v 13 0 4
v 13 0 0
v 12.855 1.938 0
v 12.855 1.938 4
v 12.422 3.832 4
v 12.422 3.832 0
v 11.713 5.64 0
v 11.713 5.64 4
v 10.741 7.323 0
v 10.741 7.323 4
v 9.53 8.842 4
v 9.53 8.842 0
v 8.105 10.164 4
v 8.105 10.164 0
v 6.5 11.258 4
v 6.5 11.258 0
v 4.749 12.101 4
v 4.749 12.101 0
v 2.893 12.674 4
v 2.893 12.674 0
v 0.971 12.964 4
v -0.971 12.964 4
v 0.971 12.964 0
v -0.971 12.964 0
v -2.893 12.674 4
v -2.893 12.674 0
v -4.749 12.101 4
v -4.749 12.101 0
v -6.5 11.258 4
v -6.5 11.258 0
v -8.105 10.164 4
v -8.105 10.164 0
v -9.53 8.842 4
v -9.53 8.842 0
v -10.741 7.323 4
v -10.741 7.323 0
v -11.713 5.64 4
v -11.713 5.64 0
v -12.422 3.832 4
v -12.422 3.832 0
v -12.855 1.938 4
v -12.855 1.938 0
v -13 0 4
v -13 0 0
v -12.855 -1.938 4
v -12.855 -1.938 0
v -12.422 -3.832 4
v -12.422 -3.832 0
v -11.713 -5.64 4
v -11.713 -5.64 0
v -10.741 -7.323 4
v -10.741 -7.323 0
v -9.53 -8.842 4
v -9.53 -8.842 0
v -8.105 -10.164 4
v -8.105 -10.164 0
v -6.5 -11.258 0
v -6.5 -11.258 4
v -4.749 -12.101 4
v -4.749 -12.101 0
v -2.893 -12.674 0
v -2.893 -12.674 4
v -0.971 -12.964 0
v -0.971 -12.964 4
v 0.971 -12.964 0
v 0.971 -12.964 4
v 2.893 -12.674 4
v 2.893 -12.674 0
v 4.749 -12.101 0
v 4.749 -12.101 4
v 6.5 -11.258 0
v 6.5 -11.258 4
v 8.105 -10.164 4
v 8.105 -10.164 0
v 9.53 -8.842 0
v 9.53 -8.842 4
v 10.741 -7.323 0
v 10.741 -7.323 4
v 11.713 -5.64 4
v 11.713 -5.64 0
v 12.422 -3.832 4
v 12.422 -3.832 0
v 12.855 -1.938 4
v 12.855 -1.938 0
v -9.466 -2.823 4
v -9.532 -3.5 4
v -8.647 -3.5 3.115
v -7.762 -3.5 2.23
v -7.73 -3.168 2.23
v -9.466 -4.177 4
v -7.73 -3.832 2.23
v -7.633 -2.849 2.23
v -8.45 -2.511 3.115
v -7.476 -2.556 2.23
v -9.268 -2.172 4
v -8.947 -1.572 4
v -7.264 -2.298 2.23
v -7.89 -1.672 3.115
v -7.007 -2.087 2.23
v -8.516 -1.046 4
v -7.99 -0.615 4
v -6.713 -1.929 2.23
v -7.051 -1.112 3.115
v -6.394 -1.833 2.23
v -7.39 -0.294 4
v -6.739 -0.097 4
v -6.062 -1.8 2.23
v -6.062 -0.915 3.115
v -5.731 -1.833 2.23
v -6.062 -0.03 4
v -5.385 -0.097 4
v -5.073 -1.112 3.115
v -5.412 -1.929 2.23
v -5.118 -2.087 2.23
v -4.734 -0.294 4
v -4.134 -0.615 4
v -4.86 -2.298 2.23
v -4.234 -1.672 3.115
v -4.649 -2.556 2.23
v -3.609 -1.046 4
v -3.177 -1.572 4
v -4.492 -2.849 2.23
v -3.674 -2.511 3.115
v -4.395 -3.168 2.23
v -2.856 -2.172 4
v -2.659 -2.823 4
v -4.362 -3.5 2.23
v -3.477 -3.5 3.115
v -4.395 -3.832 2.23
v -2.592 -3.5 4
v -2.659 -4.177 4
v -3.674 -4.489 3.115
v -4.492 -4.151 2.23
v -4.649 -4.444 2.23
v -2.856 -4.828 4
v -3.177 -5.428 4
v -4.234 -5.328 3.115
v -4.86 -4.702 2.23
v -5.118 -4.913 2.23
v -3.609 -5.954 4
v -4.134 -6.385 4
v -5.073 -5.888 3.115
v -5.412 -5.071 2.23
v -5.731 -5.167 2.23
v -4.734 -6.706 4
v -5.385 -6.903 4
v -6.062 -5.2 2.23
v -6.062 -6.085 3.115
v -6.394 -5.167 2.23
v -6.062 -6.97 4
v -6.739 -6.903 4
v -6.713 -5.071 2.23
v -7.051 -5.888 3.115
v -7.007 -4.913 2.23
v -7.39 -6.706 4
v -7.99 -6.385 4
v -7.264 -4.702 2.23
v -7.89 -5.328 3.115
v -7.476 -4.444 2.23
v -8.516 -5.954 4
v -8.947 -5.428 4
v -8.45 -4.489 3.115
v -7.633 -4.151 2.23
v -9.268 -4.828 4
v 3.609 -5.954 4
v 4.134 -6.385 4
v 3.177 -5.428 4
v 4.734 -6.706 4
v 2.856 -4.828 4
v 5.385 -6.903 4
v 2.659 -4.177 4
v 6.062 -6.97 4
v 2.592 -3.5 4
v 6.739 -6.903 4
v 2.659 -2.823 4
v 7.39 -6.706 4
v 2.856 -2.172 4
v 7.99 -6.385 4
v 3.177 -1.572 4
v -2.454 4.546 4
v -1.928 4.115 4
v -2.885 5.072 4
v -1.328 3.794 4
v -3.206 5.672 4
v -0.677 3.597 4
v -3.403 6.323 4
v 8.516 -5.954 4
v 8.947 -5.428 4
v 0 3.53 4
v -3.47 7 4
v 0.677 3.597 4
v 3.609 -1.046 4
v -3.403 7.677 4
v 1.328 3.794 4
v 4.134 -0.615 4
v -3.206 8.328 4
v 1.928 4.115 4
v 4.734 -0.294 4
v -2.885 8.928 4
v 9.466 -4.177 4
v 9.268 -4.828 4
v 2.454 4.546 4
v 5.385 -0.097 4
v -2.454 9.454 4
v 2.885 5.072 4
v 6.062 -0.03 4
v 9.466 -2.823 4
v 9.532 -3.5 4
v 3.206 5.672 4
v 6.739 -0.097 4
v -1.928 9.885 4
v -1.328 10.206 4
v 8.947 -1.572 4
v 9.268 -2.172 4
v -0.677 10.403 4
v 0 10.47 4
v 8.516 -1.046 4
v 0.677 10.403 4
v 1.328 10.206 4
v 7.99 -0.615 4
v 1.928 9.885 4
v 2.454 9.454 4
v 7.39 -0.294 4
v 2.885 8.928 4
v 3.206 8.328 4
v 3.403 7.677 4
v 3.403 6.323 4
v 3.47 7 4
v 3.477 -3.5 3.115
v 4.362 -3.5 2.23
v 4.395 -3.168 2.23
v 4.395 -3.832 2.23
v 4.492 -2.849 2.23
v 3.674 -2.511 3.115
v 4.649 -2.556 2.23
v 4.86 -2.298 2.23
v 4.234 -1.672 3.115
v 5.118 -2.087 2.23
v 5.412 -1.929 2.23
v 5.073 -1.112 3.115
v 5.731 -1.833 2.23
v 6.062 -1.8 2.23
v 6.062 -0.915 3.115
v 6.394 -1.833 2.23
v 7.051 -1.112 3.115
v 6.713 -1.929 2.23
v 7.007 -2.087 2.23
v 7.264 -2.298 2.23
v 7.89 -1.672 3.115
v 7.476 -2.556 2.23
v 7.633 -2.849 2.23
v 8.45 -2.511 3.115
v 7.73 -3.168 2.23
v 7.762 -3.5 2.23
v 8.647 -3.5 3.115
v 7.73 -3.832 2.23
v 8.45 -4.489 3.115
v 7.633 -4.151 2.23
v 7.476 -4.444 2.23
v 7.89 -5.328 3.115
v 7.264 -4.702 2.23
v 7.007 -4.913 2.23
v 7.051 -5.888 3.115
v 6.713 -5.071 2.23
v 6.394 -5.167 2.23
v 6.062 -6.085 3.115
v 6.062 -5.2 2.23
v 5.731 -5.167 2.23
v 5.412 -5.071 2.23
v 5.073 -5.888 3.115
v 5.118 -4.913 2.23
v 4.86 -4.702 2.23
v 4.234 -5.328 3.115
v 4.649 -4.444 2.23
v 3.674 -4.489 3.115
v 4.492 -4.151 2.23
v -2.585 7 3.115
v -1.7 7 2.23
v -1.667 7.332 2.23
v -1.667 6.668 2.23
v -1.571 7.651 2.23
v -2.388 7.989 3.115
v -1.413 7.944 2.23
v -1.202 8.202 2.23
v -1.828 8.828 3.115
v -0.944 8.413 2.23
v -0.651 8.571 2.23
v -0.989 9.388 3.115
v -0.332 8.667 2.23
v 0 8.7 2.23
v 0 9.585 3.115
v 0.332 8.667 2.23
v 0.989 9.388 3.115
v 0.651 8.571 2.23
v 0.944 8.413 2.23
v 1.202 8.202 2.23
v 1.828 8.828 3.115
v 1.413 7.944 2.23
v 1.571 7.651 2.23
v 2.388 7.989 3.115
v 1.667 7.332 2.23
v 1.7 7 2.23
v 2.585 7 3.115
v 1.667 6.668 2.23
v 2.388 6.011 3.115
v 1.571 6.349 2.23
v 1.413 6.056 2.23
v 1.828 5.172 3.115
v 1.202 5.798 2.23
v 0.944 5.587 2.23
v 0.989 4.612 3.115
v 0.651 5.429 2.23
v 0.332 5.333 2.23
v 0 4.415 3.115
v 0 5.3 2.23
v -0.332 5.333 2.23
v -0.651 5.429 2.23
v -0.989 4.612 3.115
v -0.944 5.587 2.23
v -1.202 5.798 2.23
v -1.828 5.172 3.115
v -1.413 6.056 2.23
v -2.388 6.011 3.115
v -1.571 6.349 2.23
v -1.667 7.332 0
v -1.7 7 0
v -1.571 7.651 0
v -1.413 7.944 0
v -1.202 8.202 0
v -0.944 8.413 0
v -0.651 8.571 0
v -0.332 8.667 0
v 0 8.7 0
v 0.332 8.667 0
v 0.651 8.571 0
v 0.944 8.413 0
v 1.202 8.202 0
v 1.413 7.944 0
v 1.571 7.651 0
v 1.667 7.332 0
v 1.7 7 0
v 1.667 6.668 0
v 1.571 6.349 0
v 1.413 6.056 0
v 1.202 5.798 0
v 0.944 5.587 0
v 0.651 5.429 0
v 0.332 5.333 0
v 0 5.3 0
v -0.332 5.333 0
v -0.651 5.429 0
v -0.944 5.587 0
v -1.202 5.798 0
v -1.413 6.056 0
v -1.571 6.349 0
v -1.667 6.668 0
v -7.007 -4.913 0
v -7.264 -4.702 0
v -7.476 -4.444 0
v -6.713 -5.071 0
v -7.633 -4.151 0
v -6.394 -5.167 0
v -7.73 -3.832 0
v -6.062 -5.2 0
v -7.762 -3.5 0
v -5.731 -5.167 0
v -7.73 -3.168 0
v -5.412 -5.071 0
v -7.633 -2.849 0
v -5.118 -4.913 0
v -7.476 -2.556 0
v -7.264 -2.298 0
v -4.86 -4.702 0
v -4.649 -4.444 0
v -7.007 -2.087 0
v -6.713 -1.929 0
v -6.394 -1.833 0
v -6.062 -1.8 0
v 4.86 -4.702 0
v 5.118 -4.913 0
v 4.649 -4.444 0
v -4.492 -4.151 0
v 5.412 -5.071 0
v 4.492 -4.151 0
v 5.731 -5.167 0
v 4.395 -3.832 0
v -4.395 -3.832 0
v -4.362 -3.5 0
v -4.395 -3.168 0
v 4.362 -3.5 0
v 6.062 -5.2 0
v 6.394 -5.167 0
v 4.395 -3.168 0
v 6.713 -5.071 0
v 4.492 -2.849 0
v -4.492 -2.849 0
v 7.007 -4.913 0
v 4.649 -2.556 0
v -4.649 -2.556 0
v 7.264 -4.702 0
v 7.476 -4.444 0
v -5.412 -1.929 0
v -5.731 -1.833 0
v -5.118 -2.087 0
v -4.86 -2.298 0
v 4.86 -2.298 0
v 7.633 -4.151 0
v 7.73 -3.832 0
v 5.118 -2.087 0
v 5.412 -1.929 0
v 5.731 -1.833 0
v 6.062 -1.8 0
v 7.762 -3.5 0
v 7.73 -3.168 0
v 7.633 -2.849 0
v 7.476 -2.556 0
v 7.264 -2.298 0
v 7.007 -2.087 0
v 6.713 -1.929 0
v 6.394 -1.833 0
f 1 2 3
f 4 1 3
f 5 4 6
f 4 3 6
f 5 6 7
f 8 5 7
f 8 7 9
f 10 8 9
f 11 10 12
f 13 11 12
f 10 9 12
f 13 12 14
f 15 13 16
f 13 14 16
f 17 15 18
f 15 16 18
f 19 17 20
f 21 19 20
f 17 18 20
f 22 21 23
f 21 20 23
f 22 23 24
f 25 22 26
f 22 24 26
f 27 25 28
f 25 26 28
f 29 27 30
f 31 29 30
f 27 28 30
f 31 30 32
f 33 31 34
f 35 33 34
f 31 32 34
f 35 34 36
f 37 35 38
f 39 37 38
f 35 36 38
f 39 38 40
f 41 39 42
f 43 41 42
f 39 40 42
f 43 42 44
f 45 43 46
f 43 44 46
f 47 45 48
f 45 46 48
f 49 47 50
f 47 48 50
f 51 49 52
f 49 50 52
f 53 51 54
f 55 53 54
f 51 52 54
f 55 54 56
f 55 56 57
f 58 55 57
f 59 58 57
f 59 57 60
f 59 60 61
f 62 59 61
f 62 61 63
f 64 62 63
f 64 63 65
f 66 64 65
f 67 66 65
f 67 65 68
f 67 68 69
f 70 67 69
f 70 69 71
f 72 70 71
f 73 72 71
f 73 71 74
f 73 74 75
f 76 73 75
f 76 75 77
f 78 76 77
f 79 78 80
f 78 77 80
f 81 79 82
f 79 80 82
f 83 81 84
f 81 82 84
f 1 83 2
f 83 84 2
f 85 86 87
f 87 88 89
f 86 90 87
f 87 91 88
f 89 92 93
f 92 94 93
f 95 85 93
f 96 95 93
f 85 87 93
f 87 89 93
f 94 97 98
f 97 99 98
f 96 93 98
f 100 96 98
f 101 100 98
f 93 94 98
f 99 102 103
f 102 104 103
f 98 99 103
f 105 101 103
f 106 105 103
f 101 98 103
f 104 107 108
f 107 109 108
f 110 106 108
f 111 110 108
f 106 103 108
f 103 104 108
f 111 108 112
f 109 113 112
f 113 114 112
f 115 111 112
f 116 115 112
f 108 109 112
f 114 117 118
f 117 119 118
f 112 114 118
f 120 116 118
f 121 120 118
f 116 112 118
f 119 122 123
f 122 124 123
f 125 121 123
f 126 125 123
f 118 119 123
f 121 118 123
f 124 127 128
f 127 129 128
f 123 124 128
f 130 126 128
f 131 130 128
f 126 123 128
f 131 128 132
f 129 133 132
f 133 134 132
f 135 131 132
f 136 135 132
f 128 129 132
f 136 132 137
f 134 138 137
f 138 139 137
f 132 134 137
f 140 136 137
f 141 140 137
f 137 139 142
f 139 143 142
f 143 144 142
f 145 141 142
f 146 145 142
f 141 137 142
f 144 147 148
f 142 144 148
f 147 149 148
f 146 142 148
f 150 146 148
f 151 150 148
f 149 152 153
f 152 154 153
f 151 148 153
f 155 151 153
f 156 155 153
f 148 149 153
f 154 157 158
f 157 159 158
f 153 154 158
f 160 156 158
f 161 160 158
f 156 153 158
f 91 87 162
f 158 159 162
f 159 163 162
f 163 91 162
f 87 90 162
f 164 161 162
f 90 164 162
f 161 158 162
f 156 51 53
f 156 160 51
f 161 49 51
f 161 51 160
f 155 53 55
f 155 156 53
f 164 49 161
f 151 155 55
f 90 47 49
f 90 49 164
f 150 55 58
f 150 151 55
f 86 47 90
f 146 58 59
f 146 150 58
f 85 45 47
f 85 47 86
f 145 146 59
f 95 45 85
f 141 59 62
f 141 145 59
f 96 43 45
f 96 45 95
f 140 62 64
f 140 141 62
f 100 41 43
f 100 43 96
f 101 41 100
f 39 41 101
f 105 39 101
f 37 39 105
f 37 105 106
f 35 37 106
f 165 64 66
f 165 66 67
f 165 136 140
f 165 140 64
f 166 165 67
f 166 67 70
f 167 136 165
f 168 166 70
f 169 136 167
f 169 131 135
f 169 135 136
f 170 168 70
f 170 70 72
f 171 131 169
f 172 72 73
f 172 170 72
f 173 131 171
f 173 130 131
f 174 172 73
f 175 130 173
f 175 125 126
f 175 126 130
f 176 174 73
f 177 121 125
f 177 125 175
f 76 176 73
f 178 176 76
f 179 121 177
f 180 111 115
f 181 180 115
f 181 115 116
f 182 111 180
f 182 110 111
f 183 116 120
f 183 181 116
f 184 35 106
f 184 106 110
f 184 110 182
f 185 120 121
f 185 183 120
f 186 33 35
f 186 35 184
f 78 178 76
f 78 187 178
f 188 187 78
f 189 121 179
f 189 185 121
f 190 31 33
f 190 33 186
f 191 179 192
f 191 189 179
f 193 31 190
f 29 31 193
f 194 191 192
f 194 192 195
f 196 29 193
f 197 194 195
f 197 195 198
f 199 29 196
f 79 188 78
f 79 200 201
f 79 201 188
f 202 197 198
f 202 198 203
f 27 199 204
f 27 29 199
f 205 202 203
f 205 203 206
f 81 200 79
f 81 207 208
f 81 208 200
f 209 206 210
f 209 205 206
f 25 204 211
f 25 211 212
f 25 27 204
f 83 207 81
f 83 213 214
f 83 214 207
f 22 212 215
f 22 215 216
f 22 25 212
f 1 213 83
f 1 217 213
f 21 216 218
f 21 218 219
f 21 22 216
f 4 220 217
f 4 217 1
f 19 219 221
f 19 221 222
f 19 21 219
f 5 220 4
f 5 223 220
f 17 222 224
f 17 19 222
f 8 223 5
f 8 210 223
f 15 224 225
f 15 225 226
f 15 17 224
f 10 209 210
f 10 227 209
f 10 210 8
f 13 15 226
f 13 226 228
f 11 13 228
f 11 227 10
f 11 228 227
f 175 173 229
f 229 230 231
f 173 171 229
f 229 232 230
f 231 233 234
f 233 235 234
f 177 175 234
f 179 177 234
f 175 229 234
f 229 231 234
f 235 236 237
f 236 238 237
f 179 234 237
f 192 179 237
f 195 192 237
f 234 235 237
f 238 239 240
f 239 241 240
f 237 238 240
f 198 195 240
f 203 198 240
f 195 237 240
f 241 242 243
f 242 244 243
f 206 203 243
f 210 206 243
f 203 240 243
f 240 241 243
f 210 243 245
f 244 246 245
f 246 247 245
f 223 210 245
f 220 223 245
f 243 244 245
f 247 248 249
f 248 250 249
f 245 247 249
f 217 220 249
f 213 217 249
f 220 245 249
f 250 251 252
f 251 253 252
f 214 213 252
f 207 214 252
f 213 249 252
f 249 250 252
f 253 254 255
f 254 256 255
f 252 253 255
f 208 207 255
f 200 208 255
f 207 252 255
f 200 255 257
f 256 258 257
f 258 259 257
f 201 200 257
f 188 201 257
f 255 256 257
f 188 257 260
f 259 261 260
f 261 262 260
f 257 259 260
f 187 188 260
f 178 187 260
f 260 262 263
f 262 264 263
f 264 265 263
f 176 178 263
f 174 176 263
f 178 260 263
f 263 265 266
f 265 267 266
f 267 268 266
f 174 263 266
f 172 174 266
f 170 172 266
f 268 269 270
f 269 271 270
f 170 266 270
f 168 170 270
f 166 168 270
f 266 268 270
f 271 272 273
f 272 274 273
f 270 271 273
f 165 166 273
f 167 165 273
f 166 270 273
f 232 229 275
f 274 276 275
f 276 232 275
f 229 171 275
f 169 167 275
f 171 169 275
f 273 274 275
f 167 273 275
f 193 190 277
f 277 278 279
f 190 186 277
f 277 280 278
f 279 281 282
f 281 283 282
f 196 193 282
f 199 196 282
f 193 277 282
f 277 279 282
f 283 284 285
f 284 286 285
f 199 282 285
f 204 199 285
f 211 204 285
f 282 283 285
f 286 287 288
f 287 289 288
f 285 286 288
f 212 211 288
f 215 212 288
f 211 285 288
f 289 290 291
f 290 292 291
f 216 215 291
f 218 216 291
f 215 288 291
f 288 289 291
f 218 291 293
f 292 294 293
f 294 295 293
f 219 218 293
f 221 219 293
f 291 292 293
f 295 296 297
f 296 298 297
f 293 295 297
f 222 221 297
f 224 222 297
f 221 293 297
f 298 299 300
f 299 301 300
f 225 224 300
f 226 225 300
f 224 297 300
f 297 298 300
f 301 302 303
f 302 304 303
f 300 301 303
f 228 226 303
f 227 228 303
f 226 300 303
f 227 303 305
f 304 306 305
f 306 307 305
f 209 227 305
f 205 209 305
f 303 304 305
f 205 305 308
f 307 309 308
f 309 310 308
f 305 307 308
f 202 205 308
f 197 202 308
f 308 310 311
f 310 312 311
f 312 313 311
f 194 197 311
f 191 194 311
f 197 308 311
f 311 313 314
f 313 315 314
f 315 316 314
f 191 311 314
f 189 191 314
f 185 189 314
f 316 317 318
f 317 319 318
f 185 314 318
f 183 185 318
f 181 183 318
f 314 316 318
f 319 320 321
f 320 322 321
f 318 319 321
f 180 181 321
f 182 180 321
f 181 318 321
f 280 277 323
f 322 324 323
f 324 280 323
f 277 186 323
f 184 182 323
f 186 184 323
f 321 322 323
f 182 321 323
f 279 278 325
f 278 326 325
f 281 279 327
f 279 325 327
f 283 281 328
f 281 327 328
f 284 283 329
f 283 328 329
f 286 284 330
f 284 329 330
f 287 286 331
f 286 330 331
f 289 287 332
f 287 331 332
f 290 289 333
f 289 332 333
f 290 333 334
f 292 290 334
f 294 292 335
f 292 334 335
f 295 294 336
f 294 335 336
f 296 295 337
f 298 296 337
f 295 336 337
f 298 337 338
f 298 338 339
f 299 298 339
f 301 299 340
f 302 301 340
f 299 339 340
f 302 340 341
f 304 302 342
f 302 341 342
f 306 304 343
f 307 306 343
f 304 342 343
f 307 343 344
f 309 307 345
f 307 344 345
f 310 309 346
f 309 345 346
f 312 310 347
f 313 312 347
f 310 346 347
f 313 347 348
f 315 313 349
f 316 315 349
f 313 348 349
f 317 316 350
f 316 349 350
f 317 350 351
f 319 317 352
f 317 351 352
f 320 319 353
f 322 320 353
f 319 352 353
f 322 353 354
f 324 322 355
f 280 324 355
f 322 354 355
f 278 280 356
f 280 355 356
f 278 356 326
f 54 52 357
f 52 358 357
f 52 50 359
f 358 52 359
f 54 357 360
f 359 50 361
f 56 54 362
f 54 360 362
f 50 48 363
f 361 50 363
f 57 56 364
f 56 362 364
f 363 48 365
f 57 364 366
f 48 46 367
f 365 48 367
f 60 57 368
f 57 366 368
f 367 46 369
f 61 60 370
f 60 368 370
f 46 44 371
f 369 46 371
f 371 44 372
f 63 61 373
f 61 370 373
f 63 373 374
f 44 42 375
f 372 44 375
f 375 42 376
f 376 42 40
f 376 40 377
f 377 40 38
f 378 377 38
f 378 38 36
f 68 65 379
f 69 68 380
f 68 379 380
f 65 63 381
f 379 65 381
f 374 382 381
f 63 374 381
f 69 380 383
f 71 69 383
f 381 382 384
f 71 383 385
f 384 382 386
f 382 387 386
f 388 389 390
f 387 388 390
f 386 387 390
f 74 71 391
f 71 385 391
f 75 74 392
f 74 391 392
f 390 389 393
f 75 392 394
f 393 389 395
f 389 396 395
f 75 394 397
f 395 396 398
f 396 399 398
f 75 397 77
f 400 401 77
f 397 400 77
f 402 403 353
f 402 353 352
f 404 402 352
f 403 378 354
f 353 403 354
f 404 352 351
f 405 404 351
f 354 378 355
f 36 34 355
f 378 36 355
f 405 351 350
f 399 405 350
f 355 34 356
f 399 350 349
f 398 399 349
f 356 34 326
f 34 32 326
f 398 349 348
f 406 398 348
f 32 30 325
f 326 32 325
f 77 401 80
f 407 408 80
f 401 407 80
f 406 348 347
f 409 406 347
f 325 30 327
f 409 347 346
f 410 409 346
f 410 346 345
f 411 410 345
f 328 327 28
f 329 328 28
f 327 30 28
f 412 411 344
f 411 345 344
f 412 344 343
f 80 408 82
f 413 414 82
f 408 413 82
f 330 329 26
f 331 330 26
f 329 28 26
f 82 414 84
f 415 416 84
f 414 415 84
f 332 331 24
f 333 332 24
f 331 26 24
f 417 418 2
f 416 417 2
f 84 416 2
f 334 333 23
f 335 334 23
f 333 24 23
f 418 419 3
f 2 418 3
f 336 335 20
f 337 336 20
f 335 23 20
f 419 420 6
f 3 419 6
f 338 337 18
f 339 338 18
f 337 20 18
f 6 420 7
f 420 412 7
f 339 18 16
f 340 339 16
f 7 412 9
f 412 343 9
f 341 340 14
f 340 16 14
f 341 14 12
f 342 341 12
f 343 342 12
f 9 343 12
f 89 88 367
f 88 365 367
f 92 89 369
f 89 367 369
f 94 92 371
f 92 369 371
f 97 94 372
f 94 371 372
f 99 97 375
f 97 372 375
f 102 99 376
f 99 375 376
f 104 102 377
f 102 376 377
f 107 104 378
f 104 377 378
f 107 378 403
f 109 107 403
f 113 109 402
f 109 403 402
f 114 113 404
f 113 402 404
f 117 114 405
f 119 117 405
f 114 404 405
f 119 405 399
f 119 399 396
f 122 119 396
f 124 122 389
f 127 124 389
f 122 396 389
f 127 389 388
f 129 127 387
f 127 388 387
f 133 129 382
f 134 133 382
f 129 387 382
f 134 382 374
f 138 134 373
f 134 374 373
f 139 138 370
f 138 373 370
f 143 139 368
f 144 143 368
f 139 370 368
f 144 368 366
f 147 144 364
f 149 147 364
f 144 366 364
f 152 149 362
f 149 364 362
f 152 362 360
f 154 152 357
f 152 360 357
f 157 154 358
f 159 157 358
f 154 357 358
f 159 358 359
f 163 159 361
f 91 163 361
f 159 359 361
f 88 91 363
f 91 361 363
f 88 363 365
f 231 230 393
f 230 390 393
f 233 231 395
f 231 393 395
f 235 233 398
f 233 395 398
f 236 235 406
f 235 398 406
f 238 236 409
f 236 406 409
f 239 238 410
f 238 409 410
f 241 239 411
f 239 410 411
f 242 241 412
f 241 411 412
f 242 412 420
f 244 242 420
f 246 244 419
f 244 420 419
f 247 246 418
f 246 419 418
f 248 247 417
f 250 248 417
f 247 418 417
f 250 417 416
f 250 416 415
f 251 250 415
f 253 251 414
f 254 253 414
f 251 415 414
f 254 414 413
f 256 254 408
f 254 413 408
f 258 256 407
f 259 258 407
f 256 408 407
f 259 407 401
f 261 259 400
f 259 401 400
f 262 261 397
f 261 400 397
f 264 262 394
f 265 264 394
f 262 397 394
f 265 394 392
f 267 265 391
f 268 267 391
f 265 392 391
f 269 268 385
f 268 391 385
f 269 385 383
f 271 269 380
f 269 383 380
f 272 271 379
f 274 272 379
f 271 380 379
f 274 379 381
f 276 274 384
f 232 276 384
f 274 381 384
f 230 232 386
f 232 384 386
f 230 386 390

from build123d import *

# Parameters (mm, degrees)
SKETCH1_R                                            = 13
BOSS_EXTRUDE1_DEPTH                                  = 4
CSK_FOR_M3_HEX_SOCKET_COUNTERSUNK_HEAD_S_D           = 3.4
CSK_FOR_M3_HEX_SOCKET_COUNTERSUNK_HEAD_S_DEPTH       = 12
CSK_FOR_M3_HEX_SOCKET_COUNTERSUNK_HEAD_S_CSINK_D     = 6.94
CSK_FOR_M3_HEX_SOCKET_COUNTERSUNK_HEAD_S_CSINK_ANGLE = 90
CSK_FOR_M3_HEX_SOCKET_COUNTERSUNK_HEAD_S_TIP         = 1.021463052


with BuildPart() as part:
    # Sketch1 → Boss-Extrude1 (new body)
    with BuildSketch(Plane.XY):
        Circle(SKETCH1_R)
    extrude(amount=BOSS_EXTRUDE1_DEPTH)

    # CSK for M3 Hex Socket Countersunk Head Screw1
    with Locations(Plane.XY.offset(4)):
        with Locations((0, 7), (6.062177826, -3.5), (-6.062177826, -3.5)):
            CounterSinkHole(CSK_FOR_M3_HEX_SOCKET_COUNTERSUNK_HEAD_S_D / 2, CSK_FOR_M3_HEX_SOCKET_COUNTERSUNK_HEAD_S_CSINK_D / 2, depth=CSK_FOR_M3_HEX_SOCKET_COUNTERSUNK_HEAD_S_DEPTH, counter_sink_angle=CSK_FOR_M3_HEX_SOCKET_COUNTERSUNK_HEAD_S_CSINK_ANGLE)
            with Locations((0, 0, -(CSK_FOR_M3_HEX_SOCKET_COUNTERSUNK_HEAD_S_DEPTH + CSK_FOR_M3_HEX_SOCKET_COUNTERSUNK_HEAD_S_TIP / 2))):  # 118° drill point
                Cone(0, CSK_FOR_M3_HEX_SOCKET_COUNTERSUNK_HEAD_S_D / 2, CSK_FOR_M3_HEX_SOCKET_COUNTERSUNK_HEAD_S_TIP, mode=Mode.SUBTRACT)


solid = part.part
